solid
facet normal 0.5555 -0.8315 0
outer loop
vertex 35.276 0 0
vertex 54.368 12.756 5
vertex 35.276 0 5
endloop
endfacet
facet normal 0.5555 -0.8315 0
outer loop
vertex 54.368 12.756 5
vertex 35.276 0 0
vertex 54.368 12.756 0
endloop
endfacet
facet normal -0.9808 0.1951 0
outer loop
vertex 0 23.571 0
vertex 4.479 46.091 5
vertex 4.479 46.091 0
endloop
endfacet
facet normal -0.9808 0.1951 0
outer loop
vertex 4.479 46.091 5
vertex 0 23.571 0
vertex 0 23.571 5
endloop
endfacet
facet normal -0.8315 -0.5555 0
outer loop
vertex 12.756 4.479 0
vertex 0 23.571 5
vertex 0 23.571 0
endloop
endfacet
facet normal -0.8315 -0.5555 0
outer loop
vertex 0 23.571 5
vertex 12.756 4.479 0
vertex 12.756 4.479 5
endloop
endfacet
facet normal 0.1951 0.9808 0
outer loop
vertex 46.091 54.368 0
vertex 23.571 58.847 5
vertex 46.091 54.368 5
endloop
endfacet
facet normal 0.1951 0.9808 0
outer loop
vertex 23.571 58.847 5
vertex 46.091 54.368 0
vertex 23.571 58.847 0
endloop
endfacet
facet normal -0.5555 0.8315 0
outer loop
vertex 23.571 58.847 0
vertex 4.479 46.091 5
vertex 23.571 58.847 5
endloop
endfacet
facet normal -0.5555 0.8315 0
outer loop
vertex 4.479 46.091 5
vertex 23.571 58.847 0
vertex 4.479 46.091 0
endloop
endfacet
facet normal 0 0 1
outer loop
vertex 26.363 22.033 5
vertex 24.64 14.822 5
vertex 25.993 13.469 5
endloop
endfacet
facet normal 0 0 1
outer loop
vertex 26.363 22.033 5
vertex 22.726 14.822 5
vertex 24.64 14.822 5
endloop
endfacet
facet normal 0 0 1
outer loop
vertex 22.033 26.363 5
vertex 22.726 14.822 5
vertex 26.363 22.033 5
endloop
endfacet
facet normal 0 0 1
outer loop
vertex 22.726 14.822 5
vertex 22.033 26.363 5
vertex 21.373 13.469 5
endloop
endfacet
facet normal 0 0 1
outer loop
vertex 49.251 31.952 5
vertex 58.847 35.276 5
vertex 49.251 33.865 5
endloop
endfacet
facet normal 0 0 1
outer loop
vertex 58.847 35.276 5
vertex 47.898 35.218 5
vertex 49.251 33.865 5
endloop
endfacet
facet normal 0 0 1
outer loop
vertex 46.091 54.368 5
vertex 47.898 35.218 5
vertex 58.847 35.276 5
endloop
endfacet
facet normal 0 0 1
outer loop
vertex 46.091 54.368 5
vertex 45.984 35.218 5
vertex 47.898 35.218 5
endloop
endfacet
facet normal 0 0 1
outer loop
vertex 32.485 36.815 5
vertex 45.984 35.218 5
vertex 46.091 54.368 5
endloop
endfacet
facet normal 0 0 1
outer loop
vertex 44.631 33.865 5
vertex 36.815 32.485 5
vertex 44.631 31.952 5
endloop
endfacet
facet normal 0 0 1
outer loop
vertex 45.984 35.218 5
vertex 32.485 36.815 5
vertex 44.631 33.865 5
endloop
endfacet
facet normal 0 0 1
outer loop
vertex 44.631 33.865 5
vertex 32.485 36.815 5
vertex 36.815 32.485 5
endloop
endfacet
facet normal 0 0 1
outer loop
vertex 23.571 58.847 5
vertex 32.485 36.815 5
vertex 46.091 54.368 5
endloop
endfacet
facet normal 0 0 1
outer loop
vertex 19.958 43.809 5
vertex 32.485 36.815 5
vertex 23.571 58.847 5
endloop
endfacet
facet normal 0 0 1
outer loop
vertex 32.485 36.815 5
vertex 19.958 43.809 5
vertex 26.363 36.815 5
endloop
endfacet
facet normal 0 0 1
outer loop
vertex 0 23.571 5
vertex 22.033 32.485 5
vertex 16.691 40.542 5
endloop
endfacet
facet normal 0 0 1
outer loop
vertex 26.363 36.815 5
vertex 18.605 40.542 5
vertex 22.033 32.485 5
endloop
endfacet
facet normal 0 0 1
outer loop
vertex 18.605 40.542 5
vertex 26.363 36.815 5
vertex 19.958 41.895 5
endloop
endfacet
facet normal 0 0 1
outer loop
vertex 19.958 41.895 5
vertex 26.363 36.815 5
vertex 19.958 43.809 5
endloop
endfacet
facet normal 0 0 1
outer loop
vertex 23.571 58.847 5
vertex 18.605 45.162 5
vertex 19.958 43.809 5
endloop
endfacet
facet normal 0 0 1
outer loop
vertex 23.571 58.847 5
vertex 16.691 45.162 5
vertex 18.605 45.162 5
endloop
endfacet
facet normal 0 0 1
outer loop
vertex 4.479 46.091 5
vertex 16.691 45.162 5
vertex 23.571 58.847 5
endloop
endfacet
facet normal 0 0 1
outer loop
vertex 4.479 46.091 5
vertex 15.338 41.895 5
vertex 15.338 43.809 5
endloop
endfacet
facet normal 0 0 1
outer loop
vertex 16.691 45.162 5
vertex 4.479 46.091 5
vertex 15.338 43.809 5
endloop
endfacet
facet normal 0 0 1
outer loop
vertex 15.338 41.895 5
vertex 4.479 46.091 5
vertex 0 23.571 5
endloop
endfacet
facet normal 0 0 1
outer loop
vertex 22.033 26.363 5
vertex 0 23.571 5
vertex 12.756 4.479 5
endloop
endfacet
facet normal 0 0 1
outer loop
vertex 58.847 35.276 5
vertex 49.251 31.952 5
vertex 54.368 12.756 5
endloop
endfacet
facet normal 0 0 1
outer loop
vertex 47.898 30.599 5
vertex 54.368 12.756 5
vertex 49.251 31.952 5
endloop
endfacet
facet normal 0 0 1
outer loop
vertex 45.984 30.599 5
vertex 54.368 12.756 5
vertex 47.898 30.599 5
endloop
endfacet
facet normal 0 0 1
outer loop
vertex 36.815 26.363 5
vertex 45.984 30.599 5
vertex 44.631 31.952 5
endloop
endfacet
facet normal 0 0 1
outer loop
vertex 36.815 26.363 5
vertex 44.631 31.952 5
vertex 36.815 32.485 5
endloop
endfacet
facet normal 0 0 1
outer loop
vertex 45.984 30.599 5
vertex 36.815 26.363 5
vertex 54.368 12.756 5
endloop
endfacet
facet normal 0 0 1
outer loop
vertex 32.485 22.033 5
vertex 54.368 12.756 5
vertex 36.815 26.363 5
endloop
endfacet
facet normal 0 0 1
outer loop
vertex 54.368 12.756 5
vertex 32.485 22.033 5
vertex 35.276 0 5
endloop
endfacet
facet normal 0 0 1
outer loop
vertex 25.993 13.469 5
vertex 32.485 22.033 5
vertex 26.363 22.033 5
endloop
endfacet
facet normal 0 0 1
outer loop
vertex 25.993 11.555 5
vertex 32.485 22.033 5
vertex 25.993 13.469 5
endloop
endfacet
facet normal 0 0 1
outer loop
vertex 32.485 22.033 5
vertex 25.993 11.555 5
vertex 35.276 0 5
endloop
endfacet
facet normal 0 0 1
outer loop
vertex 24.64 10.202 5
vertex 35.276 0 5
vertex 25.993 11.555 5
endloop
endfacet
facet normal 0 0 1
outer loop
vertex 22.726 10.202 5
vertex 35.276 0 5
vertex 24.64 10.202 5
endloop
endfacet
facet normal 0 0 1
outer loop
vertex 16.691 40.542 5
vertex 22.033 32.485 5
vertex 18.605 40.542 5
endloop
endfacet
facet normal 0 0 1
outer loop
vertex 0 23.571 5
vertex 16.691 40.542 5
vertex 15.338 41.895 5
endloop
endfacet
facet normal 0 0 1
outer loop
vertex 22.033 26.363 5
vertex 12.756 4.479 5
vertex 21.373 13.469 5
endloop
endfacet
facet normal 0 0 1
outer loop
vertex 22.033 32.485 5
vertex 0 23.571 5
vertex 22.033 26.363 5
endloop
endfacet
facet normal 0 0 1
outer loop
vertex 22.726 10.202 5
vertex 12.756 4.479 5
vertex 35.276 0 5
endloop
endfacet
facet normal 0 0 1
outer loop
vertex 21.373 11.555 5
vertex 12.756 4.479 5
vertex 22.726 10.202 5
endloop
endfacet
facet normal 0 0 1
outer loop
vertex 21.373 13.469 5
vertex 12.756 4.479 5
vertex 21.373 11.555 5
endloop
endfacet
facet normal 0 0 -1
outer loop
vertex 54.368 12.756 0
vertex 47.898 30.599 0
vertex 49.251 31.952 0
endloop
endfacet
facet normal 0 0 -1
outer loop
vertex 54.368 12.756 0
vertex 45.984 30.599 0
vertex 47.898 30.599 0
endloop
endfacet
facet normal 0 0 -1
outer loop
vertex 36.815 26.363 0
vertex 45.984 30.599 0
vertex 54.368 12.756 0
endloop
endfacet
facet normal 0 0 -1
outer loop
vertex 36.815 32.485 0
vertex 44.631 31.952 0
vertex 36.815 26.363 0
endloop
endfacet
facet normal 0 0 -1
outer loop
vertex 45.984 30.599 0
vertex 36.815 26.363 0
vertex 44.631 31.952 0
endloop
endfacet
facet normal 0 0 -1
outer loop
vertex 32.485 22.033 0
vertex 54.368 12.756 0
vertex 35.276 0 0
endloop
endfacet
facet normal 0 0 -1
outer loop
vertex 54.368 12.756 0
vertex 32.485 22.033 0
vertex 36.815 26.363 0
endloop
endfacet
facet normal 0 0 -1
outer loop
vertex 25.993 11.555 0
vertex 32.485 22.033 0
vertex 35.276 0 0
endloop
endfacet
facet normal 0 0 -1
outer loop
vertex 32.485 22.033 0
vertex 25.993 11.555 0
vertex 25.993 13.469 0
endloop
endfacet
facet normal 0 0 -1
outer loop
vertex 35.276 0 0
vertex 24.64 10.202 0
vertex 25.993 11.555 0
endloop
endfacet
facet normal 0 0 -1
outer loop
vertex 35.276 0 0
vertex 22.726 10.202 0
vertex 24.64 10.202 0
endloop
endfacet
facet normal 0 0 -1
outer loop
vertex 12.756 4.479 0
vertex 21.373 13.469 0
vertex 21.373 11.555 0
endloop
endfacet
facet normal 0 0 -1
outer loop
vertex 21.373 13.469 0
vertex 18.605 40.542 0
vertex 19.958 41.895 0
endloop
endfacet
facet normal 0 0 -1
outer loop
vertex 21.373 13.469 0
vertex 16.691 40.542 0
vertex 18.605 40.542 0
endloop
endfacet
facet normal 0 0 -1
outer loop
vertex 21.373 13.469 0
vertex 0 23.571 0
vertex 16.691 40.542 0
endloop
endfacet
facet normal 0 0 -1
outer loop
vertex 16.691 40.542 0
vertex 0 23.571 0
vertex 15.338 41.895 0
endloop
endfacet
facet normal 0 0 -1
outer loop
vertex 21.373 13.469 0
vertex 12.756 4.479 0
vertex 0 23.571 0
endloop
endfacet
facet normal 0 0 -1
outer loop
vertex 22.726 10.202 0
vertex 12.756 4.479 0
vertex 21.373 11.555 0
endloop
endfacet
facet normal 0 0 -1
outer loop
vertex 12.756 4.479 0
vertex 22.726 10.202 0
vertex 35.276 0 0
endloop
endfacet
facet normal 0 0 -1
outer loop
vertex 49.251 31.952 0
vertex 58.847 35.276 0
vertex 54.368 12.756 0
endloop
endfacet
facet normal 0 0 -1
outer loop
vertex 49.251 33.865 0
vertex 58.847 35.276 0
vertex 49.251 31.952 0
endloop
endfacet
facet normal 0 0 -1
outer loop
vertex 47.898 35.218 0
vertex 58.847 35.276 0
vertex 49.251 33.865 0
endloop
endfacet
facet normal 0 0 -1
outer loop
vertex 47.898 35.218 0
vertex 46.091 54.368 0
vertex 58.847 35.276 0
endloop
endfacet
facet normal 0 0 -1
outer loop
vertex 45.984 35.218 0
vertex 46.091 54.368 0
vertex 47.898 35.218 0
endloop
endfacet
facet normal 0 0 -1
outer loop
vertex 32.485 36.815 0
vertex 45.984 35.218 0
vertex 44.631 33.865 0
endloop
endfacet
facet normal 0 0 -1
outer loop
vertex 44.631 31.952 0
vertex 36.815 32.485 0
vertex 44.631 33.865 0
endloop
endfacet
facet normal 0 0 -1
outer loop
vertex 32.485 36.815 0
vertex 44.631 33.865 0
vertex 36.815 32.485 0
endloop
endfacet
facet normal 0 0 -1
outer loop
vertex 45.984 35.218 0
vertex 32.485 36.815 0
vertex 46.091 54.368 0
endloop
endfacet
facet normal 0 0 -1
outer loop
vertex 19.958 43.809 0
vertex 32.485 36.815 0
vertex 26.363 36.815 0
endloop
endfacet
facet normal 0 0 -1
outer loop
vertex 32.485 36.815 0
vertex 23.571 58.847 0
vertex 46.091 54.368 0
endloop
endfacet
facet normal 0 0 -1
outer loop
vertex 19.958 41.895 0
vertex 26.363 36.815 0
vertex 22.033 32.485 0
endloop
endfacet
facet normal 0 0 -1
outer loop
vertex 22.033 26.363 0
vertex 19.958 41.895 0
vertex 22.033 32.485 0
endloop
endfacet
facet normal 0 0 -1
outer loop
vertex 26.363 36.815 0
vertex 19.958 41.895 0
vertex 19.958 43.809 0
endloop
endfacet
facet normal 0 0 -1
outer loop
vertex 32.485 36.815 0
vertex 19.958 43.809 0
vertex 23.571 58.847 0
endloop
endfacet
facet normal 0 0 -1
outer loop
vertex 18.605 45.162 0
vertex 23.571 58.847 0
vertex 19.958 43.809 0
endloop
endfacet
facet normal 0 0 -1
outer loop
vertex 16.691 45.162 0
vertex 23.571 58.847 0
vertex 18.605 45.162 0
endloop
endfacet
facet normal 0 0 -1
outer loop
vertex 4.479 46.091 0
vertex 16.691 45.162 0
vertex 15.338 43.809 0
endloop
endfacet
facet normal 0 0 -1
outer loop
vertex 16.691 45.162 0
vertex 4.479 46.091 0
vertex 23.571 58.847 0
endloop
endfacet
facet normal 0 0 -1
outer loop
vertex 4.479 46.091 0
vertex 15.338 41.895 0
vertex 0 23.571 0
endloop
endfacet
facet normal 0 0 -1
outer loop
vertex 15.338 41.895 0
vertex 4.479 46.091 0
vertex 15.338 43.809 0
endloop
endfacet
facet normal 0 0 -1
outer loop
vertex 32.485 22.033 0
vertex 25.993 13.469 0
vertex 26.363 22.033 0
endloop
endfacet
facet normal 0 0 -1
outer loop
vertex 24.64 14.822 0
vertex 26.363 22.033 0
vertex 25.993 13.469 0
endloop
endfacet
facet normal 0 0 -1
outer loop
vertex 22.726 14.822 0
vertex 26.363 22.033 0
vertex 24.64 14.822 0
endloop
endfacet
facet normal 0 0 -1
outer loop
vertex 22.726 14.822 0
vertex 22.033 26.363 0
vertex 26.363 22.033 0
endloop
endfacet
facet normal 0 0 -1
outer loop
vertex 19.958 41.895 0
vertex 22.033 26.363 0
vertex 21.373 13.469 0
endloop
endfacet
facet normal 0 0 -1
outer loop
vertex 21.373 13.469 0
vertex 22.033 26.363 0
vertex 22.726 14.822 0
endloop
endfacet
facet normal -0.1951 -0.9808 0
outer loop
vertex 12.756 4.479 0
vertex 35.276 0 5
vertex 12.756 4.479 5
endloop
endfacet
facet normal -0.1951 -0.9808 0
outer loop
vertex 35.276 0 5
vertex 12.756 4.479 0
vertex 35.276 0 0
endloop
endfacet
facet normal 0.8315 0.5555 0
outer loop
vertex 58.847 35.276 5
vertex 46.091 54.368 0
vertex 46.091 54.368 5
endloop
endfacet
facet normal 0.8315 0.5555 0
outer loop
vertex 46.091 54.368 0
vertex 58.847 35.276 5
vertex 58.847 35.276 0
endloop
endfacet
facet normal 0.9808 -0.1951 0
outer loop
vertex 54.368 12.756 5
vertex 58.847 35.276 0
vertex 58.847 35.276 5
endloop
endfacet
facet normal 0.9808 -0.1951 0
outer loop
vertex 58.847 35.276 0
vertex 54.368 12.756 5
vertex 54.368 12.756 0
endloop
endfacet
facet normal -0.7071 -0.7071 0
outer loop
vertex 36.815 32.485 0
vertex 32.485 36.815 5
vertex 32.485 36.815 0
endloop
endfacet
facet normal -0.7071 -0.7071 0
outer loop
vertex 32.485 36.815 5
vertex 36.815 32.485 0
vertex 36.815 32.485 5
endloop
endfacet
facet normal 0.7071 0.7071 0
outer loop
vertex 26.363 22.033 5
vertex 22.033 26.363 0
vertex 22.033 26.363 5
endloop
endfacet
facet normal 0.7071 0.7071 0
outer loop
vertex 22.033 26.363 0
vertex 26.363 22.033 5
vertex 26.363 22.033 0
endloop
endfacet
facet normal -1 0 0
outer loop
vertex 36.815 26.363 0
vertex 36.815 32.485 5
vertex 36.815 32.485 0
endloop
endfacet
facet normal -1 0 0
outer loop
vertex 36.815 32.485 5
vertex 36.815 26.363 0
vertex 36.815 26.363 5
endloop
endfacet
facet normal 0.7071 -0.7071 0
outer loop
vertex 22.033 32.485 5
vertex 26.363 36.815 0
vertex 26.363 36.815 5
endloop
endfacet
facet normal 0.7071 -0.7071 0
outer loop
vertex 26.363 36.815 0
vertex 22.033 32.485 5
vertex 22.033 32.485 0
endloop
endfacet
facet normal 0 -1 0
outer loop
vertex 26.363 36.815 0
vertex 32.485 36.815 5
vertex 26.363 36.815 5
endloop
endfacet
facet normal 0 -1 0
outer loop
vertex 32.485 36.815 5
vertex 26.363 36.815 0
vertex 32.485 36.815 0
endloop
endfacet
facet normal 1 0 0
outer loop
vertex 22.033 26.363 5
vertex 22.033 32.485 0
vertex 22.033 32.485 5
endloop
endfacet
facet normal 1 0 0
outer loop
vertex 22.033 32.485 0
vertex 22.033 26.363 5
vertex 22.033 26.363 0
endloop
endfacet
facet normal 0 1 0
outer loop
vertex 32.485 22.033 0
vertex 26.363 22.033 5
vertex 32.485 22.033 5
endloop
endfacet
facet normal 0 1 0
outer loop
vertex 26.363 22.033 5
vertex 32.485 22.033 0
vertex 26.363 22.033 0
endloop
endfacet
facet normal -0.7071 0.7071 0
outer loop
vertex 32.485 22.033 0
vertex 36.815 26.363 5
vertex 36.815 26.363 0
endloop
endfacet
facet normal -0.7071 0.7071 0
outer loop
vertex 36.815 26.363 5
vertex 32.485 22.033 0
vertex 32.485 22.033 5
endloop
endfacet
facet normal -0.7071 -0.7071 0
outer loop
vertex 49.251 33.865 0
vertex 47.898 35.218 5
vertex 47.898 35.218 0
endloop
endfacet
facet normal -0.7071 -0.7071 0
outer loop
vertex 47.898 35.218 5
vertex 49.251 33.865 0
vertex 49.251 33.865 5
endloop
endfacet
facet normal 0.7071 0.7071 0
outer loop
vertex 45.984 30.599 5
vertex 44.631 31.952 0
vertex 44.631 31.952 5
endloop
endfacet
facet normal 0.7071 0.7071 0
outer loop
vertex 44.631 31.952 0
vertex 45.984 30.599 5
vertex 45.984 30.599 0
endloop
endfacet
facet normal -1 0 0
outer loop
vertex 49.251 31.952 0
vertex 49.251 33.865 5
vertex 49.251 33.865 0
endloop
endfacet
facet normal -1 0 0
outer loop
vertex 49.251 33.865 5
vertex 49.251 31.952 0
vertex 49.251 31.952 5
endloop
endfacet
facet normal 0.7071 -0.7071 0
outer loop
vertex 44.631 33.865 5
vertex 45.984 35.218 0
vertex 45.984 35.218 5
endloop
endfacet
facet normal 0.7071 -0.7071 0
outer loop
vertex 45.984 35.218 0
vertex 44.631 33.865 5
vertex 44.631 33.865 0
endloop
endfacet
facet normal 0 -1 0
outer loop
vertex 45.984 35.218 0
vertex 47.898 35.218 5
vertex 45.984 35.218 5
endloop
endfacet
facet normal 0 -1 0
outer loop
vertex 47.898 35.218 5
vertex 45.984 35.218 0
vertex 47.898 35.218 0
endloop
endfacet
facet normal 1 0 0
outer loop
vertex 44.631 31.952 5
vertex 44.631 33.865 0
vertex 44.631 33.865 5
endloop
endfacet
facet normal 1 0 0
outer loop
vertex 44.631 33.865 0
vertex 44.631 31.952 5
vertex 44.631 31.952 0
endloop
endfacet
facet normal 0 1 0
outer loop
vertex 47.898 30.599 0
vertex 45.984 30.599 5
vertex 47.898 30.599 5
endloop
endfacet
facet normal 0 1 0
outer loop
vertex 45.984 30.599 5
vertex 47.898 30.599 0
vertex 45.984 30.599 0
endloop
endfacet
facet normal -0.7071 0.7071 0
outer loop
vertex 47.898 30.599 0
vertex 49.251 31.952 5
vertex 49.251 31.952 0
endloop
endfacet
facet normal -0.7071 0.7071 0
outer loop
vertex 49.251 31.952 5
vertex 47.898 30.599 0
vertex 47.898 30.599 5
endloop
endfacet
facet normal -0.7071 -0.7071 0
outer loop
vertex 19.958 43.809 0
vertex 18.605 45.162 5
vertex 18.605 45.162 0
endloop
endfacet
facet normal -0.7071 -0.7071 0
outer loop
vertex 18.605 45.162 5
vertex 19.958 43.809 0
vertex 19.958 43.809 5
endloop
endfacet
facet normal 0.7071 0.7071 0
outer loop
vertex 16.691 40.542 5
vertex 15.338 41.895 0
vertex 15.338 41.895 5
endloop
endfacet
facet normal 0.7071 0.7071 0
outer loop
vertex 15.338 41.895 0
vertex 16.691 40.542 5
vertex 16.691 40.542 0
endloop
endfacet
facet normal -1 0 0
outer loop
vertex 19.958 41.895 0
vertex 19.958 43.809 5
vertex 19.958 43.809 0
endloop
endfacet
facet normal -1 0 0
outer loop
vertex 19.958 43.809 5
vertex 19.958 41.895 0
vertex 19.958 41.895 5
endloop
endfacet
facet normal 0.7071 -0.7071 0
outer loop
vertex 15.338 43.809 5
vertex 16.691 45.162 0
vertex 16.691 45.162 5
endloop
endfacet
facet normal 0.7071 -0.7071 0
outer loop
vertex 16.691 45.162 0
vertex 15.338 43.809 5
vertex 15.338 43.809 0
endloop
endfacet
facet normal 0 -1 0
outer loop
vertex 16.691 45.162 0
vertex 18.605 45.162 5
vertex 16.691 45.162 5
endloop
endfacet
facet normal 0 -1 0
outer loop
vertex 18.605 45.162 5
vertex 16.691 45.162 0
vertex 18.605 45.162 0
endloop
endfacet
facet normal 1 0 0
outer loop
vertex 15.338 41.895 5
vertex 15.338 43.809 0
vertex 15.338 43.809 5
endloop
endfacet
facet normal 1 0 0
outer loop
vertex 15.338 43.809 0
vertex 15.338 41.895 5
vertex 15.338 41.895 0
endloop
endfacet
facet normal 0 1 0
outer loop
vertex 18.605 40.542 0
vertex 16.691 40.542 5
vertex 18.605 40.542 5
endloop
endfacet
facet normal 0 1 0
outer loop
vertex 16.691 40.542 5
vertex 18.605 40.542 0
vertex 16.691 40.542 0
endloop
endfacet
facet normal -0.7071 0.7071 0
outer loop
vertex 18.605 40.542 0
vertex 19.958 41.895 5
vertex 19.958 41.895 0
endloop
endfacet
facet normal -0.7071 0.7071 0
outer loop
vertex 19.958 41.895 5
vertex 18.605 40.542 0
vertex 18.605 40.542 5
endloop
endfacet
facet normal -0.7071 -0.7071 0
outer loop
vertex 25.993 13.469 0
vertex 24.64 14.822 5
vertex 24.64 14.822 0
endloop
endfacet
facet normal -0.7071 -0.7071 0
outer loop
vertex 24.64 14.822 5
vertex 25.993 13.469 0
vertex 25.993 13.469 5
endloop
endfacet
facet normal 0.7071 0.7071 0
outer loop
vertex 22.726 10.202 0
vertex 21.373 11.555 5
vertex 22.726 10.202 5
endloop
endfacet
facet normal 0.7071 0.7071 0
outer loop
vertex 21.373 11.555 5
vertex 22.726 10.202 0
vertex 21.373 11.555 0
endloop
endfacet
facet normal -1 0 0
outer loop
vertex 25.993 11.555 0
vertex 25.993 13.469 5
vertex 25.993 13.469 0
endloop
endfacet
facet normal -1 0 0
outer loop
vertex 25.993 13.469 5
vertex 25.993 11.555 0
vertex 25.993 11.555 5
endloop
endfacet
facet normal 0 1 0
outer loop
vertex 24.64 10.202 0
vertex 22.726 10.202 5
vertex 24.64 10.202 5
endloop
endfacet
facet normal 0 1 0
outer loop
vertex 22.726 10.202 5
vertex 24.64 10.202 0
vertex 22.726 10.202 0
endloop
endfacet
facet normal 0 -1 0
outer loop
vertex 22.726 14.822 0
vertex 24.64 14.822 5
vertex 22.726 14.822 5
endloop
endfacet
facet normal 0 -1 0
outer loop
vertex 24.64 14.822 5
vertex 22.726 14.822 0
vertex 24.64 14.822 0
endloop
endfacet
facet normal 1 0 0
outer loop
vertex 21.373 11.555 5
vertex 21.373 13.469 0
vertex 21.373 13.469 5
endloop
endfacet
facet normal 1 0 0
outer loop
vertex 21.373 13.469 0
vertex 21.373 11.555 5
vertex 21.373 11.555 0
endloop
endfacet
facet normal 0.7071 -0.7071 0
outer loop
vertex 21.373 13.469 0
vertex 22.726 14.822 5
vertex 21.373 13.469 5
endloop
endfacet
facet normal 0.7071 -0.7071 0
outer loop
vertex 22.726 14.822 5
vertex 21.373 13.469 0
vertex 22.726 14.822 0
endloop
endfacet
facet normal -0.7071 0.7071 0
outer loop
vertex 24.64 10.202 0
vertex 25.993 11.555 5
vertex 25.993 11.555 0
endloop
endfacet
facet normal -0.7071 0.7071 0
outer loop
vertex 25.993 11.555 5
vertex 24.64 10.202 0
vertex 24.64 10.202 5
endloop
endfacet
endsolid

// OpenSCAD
$fn = 32;

// ----------------------------------------------------------------------
// Polygon plate: 8-gon R30, 3 bolt windows
// ----------------------------------------------------------------------

// --- parameters (mm) ---
sides = 8;                // number of polygon sides
plate_r = 30;             // circumscribed radius of the polygon
bore_r = 8;               // centre bore radius
bolts = 3;                // number of bolt windows
ring_r = 17.86;           // bolt-circle radius
bolt_r = 2.5;             // bolt window radius
plate_t = 5;              // plate thickness, Z (extrusion height)

plate_d = 2 * plate_r;  // circumscribed diameter
bore_d = 2 * bore_r;  // centre bore diameter
bolt_d = 2 * bolt_r;  // bolt window diameter
ring_d = 2 * ring_r;  // bolt-circle diameter

profile = [[58.847, 35.276], [46.091, 54.368], [23.571, 58.847], [4.479, 46.091], [0, 23.571], [12.756, 4.479], [35.276, 0], [54.368, 12.756]];  // primary outline, 8 points, counter clockwise
void_1 = [[36.815, 32.485], [32.485, 36.815], [26.363, 36.815], [22.033, 32.485], [22.033, 26.363], [26.363, 22.033], [32.485, 22.033], [36.815, 26.363]];  // centre bore, 8 points
void_2 = [[49.251, 33.865], [47.898, 35.218], [45.984, 35.218], [44.631, 33.865], [44.631, 31.952], [45.984, 30.599], [47.898, 30.599], [49.251, 31.952]];  // bolt window 1, 8 points
void_3 = [[19.958, 43.809], [18.605, 45.162], [16.691, 45.162], [15.338, 43.809], [15.338, 41.895], [16.691, 40.542], [18.605, 40.542], [19.958, 41.895]];  // bolt window 2, 8 points
void_4 = [[25.993, 13.469], [24.64, 14.822], [22.726, 14.822], [21.373, 13.469], [21.373, 11.555], [22.726, 10.202], [24.64, 10.202], [25.993, 11.555]];  // bolt window 3, 8 points

// --- the one profile operation ---
difference() {
  linear_extrude(height = plate_t) polygon(points = profile);
  translate([0, 0, -1])
    linear_extrude(height = plate_t + 2) polygon(points = void_1);
  translate([0, 0, -1])
    linear_extrude(height = plate_t + 2) polygon(points = void_2);
  translate([0, 0, -1])
    linear_extrude(height = plate_t + 2) polygon(points = void_3);
  translate([0, 0, -1])
    linear_extrude(height = plate_t + 2) polygon(points = void_4);
}
